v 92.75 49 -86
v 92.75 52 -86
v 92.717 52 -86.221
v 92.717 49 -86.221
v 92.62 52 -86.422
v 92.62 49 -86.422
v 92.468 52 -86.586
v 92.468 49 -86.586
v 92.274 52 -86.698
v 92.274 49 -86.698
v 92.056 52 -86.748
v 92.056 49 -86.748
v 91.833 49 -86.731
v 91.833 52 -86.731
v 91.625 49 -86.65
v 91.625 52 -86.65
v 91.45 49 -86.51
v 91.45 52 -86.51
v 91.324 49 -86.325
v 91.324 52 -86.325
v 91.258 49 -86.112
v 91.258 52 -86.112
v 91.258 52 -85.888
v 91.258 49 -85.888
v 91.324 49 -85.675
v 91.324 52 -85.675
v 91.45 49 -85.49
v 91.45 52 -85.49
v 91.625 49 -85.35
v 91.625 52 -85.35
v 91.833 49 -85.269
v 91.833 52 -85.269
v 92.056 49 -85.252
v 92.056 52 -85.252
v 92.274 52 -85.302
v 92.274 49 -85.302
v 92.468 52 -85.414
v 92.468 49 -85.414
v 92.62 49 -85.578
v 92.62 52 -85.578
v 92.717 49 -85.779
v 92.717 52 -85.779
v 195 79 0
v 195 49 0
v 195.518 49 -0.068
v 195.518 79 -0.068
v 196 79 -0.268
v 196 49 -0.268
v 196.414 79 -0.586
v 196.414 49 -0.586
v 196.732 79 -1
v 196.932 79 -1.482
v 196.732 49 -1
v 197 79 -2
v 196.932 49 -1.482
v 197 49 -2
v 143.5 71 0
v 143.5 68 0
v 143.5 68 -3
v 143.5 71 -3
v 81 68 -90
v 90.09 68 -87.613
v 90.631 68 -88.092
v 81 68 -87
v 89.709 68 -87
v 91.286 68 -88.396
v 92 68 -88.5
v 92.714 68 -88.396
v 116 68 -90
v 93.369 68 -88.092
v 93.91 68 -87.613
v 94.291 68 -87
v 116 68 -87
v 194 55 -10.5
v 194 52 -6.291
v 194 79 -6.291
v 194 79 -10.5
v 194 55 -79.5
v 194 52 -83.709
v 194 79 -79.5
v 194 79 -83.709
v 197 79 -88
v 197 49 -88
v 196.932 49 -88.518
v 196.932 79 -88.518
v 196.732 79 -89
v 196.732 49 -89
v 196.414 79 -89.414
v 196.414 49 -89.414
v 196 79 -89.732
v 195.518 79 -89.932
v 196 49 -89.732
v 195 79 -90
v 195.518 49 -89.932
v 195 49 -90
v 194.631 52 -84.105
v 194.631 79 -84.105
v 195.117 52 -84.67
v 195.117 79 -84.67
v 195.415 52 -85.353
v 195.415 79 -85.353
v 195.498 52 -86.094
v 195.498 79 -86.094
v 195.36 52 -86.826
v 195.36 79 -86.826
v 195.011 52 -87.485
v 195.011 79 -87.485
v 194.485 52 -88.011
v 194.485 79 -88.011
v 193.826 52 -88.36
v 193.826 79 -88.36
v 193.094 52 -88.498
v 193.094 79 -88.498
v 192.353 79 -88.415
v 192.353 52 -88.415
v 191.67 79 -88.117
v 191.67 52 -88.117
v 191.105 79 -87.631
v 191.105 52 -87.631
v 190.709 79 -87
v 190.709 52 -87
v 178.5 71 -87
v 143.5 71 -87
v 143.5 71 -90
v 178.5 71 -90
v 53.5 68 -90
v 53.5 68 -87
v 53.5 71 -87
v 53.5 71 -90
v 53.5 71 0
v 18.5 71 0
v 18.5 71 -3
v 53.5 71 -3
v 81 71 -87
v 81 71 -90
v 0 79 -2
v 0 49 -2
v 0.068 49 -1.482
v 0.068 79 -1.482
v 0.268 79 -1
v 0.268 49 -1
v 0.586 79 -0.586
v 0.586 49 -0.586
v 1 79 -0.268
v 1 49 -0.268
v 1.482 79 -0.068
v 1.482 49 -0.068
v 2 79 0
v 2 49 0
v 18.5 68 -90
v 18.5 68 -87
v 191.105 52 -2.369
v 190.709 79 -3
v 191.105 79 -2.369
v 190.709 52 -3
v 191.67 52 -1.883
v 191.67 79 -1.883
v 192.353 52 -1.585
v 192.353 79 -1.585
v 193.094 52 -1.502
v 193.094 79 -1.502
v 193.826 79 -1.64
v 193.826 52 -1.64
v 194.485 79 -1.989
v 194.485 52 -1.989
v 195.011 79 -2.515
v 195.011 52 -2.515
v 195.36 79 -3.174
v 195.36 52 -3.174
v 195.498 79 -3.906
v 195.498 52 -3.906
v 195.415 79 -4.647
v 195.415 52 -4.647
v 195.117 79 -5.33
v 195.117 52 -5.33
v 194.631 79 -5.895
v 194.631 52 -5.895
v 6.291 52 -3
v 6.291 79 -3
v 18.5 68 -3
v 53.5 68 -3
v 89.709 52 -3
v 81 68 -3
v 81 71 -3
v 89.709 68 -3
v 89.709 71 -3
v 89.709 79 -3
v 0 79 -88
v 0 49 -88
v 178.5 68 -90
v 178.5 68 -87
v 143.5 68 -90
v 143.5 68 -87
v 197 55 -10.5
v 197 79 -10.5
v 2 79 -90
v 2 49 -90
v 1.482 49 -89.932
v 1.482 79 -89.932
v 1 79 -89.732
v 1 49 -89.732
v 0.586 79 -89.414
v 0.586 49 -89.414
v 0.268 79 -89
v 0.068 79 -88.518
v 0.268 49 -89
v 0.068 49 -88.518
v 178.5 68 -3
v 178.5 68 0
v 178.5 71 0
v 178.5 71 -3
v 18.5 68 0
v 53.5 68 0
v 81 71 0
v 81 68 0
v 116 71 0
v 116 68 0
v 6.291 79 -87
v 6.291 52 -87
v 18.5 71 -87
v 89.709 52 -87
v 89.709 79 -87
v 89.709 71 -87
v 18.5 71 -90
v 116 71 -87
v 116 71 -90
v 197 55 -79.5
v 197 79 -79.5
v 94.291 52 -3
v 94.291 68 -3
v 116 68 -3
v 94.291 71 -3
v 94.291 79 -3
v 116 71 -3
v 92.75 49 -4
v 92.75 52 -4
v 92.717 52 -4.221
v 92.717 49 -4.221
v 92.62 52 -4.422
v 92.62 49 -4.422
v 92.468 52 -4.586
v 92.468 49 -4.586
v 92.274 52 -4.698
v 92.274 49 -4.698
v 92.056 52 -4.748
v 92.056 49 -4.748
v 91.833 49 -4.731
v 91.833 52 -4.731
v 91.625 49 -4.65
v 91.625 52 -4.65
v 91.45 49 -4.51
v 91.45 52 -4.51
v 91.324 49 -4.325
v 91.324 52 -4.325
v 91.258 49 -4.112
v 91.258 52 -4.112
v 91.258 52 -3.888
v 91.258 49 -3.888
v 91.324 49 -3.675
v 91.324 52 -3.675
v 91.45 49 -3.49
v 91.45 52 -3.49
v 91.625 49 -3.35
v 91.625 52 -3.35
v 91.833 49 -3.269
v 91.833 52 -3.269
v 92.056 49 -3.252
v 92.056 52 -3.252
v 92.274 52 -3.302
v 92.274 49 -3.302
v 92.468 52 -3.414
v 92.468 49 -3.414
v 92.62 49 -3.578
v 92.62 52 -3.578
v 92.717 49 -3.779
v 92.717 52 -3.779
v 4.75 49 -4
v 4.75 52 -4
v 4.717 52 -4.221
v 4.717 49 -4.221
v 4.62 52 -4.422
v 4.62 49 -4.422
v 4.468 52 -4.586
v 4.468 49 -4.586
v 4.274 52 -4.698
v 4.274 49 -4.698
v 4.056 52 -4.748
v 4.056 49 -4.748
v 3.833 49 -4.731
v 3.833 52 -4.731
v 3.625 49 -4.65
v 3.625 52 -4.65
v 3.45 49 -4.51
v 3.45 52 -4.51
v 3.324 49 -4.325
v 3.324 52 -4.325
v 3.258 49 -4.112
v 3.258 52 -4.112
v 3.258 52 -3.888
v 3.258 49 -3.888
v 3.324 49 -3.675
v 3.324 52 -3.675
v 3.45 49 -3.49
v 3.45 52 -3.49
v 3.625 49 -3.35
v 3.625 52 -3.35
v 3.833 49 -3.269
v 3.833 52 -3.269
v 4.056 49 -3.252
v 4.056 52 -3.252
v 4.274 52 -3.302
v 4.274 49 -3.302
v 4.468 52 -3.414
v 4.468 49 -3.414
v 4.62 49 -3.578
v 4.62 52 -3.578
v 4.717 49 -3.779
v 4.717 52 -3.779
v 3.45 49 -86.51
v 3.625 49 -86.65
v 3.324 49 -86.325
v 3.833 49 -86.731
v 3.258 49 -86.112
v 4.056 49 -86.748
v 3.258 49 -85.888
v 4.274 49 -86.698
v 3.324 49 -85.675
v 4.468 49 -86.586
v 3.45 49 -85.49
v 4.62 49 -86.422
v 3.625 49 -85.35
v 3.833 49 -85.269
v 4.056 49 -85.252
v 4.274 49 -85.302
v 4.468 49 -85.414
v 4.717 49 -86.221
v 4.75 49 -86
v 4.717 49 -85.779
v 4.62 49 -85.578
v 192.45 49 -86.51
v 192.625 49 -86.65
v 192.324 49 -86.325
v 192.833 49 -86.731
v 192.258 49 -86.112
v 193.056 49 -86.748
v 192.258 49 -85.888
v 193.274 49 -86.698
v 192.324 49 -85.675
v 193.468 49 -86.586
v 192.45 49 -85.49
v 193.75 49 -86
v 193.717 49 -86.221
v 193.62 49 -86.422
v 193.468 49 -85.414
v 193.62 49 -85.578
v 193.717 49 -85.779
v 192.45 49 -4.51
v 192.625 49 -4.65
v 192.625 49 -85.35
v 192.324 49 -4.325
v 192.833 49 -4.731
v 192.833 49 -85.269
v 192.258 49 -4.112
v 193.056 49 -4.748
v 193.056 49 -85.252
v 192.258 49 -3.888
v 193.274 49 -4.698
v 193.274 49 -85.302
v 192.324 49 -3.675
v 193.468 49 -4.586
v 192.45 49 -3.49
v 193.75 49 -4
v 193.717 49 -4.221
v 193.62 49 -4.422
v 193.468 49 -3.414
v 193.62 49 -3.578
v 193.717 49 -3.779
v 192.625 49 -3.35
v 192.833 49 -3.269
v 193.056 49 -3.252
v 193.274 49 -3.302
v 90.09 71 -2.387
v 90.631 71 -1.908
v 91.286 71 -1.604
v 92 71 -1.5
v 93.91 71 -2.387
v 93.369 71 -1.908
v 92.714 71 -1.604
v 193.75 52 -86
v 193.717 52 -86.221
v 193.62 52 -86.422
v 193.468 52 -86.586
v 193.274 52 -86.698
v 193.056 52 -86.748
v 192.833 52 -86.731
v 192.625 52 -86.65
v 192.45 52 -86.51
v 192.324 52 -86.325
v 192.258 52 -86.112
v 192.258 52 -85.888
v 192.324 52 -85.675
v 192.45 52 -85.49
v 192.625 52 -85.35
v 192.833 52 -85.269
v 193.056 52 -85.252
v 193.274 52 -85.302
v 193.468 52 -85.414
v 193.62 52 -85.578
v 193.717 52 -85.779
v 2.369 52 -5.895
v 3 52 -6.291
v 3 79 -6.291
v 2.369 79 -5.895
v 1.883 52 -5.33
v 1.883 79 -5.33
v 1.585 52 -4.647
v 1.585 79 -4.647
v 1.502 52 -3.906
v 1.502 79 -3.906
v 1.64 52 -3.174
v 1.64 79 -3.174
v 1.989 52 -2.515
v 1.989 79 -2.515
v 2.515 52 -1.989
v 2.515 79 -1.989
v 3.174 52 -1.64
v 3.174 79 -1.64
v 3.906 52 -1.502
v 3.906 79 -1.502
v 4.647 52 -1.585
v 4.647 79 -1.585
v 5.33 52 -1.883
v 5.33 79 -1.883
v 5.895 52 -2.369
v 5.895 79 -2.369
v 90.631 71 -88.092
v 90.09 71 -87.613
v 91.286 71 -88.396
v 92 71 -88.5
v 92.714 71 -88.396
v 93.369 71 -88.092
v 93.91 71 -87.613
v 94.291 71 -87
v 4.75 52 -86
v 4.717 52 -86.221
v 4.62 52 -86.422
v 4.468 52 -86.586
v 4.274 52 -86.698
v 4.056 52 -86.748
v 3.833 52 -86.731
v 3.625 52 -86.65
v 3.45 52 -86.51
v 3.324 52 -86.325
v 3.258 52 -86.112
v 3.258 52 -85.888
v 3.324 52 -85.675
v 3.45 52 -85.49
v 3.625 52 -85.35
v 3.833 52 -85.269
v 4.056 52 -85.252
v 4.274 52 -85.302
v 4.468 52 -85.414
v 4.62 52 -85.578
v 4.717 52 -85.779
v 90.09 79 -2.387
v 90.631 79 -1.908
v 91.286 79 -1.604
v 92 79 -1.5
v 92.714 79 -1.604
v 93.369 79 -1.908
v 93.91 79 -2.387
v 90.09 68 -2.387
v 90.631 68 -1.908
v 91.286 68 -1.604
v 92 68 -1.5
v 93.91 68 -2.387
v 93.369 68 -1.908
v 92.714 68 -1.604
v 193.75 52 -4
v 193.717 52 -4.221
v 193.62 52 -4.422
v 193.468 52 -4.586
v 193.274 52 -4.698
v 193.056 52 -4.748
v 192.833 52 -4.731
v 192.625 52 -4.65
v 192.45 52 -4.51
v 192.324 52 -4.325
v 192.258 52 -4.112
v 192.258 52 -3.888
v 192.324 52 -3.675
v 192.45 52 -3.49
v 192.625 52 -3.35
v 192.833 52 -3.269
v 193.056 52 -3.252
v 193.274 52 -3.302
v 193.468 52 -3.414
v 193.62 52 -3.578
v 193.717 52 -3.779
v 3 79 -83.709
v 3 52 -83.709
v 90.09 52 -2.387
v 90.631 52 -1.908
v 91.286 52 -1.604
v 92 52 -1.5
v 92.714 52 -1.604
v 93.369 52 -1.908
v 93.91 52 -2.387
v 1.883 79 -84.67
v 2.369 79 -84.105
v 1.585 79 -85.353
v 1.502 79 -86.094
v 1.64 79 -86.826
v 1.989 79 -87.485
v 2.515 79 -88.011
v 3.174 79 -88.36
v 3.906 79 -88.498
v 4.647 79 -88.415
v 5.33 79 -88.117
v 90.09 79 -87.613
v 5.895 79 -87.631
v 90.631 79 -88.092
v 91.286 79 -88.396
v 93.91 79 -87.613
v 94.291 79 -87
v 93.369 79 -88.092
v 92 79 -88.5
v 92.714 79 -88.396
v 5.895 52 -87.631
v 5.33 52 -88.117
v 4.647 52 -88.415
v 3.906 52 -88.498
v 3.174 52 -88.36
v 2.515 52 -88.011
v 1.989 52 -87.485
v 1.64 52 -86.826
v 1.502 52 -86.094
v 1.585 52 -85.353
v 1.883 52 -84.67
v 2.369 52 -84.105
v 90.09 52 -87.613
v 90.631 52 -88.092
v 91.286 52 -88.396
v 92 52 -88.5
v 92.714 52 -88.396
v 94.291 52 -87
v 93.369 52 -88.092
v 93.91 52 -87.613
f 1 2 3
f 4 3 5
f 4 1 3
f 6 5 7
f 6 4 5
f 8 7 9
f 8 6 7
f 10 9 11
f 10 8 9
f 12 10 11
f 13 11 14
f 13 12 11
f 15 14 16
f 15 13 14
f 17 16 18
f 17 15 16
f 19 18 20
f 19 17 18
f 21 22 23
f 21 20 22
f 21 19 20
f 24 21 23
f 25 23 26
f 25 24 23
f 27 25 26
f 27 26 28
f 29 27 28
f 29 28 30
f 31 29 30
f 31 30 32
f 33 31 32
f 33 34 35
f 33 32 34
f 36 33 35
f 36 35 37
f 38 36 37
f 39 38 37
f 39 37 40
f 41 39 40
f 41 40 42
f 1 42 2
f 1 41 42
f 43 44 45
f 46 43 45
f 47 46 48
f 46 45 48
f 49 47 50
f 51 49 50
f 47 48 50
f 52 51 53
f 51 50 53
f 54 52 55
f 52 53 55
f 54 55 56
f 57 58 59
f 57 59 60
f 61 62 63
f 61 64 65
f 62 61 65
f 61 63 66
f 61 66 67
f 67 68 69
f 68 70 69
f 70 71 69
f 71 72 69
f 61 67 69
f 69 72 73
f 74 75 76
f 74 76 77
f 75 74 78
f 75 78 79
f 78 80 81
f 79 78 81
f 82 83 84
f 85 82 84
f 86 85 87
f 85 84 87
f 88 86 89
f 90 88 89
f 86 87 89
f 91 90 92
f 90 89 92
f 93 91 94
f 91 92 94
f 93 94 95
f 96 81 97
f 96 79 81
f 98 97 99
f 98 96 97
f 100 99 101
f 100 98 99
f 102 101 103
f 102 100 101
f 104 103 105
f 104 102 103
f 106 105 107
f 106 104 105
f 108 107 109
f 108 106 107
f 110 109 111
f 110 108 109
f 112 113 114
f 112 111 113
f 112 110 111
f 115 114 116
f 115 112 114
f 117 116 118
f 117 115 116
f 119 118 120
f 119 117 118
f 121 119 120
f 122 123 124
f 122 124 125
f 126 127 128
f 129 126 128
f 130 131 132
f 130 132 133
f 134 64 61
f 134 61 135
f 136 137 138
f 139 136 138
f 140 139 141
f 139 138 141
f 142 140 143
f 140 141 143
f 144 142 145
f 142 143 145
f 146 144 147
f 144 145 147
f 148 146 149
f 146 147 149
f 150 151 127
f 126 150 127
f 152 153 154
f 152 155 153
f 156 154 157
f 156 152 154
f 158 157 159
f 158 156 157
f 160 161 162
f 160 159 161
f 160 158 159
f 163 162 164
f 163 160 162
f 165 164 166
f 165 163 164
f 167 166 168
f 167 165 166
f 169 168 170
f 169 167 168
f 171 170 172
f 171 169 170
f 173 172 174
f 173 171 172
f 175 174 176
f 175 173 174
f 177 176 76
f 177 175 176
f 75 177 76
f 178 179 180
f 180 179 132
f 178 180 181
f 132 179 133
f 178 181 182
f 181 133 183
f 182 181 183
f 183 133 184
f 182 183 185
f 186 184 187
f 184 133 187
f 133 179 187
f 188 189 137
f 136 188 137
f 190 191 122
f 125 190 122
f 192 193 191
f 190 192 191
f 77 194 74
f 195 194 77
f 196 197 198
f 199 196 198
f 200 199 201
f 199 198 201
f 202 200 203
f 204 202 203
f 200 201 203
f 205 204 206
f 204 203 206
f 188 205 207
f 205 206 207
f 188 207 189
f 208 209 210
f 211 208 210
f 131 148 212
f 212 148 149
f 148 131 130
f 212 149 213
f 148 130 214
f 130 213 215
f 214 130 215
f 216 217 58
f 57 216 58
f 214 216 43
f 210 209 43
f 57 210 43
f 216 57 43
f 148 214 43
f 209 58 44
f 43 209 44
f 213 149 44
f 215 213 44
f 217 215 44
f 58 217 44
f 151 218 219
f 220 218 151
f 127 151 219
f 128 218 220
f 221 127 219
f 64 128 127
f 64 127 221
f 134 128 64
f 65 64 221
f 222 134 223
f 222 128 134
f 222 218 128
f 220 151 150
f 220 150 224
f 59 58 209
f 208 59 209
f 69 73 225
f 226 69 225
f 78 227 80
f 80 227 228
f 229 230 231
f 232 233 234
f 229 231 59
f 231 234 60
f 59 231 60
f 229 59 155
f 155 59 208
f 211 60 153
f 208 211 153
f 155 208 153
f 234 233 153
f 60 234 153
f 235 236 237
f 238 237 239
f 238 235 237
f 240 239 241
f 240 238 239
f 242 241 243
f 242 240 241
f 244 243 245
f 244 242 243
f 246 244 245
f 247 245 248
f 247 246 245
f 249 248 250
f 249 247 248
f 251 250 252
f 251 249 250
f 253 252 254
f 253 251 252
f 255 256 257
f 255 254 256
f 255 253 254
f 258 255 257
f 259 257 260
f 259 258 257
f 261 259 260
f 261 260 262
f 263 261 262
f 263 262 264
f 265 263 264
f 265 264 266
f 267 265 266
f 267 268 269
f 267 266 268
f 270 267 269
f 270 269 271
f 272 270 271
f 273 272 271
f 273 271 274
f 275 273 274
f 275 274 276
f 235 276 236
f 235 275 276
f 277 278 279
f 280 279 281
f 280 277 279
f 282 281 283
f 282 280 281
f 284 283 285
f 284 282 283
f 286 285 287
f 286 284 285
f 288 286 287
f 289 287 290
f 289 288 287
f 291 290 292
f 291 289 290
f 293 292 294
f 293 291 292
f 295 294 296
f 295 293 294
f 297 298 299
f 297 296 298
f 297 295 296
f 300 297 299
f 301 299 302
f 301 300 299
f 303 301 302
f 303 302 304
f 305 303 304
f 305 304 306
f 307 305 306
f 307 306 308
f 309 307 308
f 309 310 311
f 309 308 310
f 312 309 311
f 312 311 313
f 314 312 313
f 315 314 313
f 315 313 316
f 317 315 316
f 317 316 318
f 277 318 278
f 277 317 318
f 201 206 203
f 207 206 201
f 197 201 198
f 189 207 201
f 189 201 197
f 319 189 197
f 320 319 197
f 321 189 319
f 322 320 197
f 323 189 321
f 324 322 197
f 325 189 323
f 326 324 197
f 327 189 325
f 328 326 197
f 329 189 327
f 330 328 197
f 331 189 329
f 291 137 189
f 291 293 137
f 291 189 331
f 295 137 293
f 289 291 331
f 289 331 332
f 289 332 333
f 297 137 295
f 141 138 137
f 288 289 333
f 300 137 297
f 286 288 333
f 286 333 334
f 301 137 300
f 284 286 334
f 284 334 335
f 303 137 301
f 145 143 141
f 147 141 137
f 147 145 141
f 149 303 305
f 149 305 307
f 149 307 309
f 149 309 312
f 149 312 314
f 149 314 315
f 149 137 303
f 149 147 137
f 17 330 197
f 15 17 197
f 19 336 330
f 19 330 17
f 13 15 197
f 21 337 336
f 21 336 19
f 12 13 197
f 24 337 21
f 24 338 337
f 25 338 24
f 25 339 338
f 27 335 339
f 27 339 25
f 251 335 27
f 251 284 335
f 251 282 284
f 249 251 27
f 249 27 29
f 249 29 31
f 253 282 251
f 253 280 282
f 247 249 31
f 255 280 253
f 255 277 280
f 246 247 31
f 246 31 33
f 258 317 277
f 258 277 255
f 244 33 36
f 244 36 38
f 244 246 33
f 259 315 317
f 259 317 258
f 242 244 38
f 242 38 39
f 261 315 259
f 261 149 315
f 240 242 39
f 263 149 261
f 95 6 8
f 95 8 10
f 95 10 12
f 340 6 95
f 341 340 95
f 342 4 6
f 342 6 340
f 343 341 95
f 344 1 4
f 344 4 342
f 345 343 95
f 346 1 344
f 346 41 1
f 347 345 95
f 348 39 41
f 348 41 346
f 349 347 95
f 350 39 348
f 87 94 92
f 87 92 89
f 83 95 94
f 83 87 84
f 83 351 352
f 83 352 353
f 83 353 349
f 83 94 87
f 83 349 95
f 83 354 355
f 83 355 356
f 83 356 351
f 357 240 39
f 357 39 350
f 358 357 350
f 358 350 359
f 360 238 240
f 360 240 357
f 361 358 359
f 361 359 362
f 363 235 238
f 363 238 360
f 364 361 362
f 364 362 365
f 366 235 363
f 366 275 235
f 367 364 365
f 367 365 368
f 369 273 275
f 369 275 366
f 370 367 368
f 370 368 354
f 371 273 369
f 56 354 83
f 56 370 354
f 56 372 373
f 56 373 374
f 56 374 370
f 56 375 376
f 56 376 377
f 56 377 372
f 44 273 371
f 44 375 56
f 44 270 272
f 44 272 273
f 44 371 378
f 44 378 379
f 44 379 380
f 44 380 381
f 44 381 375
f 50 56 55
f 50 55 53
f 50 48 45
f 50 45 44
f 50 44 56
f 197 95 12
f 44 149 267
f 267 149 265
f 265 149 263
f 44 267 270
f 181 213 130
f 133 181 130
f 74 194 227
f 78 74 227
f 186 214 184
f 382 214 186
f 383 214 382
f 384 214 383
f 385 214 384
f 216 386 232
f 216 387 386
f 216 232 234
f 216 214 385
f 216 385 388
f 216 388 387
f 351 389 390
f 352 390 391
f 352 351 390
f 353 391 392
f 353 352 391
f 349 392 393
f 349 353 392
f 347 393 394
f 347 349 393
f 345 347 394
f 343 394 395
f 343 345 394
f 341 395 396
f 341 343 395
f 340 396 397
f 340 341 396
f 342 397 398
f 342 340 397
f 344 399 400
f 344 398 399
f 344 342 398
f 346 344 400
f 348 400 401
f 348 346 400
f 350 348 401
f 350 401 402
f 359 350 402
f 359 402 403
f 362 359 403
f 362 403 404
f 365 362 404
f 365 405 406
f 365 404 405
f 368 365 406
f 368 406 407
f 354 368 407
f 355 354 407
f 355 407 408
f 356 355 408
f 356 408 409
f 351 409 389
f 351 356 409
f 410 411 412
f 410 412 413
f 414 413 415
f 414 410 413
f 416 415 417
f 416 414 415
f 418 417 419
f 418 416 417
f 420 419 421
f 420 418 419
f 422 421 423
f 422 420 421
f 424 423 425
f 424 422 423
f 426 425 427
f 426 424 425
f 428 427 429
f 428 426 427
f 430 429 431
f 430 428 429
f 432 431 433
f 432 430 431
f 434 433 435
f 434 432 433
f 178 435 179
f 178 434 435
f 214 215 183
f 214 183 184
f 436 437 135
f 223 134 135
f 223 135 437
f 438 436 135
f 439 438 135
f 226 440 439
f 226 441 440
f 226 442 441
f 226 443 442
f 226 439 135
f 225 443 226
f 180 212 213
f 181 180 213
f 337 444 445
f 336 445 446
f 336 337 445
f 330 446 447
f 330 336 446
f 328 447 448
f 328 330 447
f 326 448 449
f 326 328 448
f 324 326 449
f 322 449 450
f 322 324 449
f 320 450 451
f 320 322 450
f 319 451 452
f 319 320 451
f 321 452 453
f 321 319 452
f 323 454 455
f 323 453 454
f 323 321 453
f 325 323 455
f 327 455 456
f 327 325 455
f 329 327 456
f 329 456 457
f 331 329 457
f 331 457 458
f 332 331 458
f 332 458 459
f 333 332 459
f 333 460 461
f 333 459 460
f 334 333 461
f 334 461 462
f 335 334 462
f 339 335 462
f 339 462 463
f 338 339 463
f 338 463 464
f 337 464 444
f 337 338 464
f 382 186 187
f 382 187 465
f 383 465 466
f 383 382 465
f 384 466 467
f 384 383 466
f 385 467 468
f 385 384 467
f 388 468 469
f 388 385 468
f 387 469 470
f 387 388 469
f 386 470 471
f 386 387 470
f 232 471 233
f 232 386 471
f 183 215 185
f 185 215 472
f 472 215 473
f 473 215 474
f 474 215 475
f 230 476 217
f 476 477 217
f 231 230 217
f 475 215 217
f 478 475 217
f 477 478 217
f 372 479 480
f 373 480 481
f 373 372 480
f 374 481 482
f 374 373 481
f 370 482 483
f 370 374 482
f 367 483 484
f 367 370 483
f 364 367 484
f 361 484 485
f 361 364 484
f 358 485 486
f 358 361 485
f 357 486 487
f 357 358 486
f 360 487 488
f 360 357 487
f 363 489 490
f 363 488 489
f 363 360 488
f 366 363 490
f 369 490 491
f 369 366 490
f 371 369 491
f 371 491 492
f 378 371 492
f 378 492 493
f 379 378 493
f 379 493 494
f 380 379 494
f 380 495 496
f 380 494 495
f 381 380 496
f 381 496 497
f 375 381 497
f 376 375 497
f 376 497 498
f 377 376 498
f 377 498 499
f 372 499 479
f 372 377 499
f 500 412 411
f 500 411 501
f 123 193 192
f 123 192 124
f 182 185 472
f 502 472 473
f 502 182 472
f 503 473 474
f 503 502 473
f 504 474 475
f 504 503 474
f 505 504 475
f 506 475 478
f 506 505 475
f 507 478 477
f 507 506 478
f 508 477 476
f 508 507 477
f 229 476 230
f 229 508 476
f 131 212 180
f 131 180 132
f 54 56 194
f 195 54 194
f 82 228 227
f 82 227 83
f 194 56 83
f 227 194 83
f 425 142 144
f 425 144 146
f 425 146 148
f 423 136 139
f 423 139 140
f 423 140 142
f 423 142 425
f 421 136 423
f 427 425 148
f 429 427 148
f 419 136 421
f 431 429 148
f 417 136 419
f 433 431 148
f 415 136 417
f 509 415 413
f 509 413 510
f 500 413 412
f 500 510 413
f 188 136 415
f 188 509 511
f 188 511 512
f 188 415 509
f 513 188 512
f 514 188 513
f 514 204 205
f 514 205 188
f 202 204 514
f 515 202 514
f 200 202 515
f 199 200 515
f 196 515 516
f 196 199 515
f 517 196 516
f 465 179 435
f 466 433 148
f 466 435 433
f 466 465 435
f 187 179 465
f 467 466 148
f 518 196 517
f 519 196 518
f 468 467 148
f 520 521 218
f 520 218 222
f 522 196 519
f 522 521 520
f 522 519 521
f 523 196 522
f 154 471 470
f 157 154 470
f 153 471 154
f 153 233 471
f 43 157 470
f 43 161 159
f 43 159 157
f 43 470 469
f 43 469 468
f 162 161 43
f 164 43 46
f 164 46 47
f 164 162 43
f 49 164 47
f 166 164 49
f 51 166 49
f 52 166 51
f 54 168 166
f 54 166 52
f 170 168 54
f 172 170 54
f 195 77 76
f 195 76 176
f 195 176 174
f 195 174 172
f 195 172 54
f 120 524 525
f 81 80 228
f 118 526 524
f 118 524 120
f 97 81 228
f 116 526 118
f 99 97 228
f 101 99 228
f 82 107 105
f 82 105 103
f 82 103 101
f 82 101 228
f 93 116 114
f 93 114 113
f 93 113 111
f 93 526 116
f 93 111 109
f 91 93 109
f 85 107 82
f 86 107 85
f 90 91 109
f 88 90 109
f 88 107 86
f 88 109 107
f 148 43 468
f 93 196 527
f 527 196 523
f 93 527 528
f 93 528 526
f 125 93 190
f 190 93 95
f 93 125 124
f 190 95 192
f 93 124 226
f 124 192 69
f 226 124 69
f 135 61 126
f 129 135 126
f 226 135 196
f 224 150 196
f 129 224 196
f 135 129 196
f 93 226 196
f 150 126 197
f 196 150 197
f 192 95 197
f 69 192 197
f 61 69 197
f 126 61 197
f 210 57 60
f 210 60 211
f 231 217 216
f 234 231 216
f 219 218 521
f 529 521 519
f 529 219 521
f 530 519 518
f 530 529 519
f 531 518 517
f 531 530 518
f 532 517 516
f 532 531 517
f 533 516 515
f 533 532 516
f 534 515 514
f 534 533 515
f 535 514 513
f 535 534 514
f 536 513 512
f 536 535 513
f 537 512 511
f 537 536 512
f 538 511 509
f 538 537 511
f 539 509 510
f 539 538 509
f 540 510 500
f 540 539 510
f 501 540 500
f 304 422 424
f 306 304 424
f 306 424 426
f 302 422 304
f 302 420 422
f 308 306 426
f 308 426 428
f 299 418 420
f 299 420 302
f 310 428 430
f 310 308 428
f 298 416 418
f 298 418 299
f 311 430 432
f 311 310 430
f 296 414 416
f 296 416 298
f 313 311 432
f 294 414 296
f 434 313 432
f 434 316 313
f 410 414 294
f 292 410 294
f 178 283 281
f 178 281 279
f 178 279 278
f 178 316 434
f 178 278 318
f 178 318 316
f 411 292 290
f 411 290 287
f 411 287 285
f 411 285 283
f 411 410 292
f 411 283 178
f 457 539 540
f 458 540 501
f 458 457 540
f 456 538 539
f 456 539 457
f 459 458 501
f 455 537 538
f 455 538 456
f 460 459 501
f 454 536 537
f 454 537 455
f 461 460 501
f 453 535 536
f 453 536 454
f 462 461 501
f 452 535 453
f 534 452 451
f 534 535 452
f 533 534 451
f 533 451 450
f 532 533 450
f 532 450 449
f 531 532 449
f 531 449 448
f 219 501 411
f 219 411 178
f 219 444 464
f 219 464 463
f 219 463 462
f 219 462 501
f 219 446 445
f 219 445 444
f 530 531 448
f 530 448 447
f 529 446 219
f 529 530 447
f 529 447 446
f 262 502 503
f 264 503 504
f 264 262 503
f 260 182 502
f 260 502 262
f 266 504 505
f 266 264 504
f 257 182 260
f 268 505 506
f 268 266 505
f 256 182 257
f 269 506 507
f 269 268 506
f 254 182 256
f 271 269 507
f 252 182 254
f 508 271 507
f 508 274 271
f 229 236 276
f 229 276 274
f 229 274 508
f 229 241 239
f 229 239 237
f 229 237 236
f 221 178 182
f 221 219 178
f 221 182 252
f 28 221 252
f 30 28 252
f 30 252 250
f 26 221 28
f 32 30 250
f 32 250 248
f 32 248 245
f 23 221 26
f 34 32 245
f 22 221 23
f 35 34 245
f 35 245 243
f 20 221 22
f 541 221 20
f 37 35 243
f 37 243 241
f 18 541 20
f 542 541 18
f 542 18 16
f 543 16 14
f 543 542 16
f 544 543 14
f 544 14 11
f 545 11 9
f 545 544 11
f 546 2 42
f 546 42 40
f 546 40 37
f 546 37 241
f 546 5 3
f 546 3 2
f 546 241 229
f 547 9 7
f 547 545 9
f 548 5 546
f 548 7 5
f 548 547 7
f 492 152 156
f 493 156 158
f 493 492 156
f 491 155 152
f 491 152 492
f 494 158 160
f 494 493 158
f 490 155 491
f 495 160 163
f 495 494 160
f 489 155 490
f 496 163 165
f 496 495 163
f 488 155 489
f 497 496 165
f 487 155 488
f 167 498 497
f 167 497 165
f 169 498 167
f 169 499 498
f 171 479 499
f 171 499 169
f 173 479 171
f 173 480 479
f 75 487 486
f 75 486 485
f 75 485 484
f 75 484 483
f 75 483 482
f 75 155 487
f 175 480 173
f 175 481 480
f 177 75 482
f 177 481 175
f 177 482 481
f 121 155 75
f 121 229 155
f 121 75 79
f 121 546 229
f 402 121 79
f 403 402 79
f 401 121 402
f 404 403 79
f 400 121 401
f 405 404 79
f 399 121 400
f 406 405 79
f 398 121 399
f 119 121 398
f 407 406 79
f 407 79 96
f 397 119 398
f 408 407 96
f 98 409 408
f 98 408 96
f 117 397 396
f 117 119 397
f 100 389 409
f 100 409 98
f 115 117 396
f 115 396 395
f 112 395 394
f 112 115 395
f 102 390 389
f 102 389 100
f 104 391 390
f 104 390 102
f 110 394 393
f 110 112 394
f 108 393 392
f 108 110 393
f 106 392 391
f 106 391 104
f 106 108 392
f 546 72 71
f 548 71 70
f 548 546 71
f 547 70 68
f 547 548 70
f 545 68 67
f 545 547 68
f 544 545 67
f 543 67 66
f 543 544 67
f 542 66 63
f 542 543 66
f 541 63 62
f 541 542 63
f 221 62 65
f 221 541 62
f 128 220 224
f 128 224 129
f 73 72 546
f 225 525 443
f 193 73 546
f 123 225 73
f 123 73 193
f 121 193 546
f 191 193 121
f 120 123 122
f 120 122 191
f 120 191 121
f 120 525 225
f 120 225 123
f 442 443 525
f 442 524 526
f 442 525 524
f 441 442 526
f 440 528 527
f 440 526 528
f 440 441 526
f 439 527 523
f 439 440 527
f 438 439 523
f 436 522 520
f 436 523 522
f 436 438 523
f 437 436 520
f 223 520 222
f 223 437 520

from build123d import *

# Parameters (mm, degrees)
SKETCH2_W               = 197
SKETCH2_H               = 90
BOSS_EXTRUDE1_DEPTH     = 21
SHELL1_T                = -2
SKETCH3_R               = 3.325
SKETCH3_R_2             = 1.325
BOSS_EXTRUDE2_DEPTH     = 2
SKETCH6_R               = 1.325
CUT_EXTRUDE2_DEPTH      = 3
BOSS_EXTRUDE3_DEPTH     = 19
SKETCH10_W              = 3
SKETCH10_H              = 12
CUT_EXTRUDE5_DEPTH      = 19
SKETCH12_W              = 29.592043876
SKETCH12_H              = 2
CUT_EXTRUDE6_DEPTH      = 10
CUT_EXTRUDE6_DEPTH_BACK = 73
CUT_EXTRUDE8_DEPTH      = 10
FILLET1_R               = 2
SKETCH7_R               = 6
CUT_EXTRUDE9_DEPTH      = 10
BOSS_EXTRUDE4_DEPTH     = 24
SKETCH18_W              = 191
SKETCH18_H              = 84
CUT_EXTRUDE10_DEPTH     = 21
BOSS_EXTRUDE5_DEPTH     = 19
SKETCH22_R              = 0.75
CUT_EXTRUDE11_DEPTH     = 44
SKETCH23_R              = 2
CUT_EXTRUDE12_DEPTH     = 22
SKETCH24_W              = 197
SKETCH24_H              = 24
CUT_EXTRUDE13_DEPTH     = 91
SKETCH25_R              = 0.75
BOSS_EXTRUDE9_DEPTH     = 28
BOSS_EXTRUDE10_START    = -2
BOSS_EXTRUDE10_DEPTH    = 2
BOSS_EXTRUDE11_DEPTH    = 30
SKETCH28_W              = 191
SKETCH28_H              = 84
CUT_EXTRUDE14_DEPTH     = 27
SKETCH29_R              = 0.75
CUT_EXTRUDE15_DEPTH     = 78
SKETCH30_W              = 197
SKETCH30_H              = 49
CUT_EXTRUDE16_DEPTH     = 91
SKETCH31_W              = 69
SKETCH31_H              = 24
CUT_EXTRUDE17_DEPTH     = 10
SKETCH32_R              = 2.5
CUT_EXTRUDE18_DEPTH     = 28
SKETCH33_W              = 35
SKETCH33_H              = 3
CUT_EXTRUDE19_DEPTH     = 91


with BuildPart() as part:
    # Sketch2 → Boss-Extrude1 (new body)
    with BuildSketch(Plane(origin=(0, 0, 0), x_dir=(1, 0, 0), z_dir=(0, 1, 0))):
        with Locations((98.5, 45)):
            Rectangle(SKETCH2_W, SKETCH2_H)
    extrude(amount=BOSS_EXTRUDE1_DEPTH)

    # Shell1
    shell1_openings = [part.faces().sort_by_distance(p)[0] for p in [
        (98.5, 21, -45),
    ]]
    offset(amount=SHELL1_T, openings=shell1_openings, kind=Kind.INTERSECTION)

    # Sketch3 → Boss-Extrude2 (add)
    with BuildSketch(Plane(origin=(0.486650368, 2, 38.670182975), x_dir=(1, 0, 0), z_dir=(0, 1, 0))):
        with Locations((118.948969004, 54.089521182)):
            Circle(SKETCH3_R)
        with Locations((118.948969004, 54.089521182)):
            Circle(SKETCH3_R_2, mode=Mode.SUBTRACT)
        with Locations((95.898969004, 54.089521182)):
            Circle(SKETCH3_R)
        with Locations((95.898969004, 54.089521182)):
            Circle(SKETCH3_R_2, mode=Mode.SUBTRACT)
        with Locations((95.898969004, 112.139521182)):
            Circle(SKETCH3_R)
        with Locations((95.898969004, 112.139521182)):
            Circle(SKETCH3_R_2, mode=Mode.SUBTRACT)
        with Locations((118.948969004, 112.139521182)):
            Circle(SKETCH3_R)
        with Locations((118.948969004, 112.139521182)):
            Circle(SKETCH3_R_2, mode=Mode.SUBTRACT)
    extrude(amount=BOSS_EXTRUDE2_DEPTH)

    # Sketch6 → Cut-Extrude2 (cut, through all)
    with BuildSketch(Plane(origin=(0, 2, 0), x_dir=(1, 0, 0), z_dir=(0, 1, 0))):
        with Locations((96.385619372, 73.469338207)):
            Circle(SKETCH6_R)
        with Locations((119.435619372, 73.469338207)):
            Circle(SKETCH6_R)
        with Locations((119.435619372, 15.419338207)):
            Circle(SKETCH6_R)
        with Locations((96.385619372, 15.419338207)):
            Circle(SKETCH6_R)
    extrude(amount=-CUT_EXTRUDE2_DEPTH, mode=Mode.SUBTRACT)

    # Sketch8 → Boss-Extrude3 (add)
    with BuildSketch(Plane(origin=(0, 2, 0), x_dir=(1, 0, 0), z_dir=(0, 1, 0))):
        Polygon((2, 28), (87, 28), (87, 87), (2, 87), (2, 90), (90, 90), (90, 25), (2, 25), align=None)
    extrude(amount=BOSS_EXTRUDE3_DEPTH)

    # Sketch10 → Cut-Extrude5 (cut)
    with BuildSketch(Plane(origin=(0, 21, 0), x_dir=(1, 0, 0), z_dir=(0, 1, 0))):
        with Locations((88.5, 57.5)):
            Rectangle(SKETCH10_W, SKETCH10_H)
    extrude(amount=-CUT_EXTRUDE5_DEPTH, mode=Mode.SUBTRACT)

    # Sketch12 → Cut-Extrude6 (cut, two sides)
    with BuildSketch(Plane(origin=(0, 0, -75), x_dir=(-1, 0, 0), z_dir=(0, 0, -1))) as cut_extrude6_sk:
        with Locations((-42.979341868, 13.109706)):
            Rectangle(SKETCH12_W, SKETCH12_H)
        with Locations((-42.979341868, 8.109706)):
            Rectangle(SKETCH12_W, SKETCH12_H)
    extrude(amount=CUT_EXTRUDE6_DEPTH, mode=Mode.SUBTRACT)
    extrude(cut_extrude6_sk.sketch, amount=-CUT_EXTRUDE6_DEPTH_BACK, mode=Mode.SUBTRACT)

    # Sketch16 → Cut-Extrude8 (cut)
    with BuildSketch(Plane(origin=(197, 0, 0), x_dir=(0, 0, -1), z_dir=(1, 0, 0))):
        with BuildLine():
            Line((48, 14.235547834), (48, 21))
            Line((48, 21), (42, 21))
            Line((42, 21), (42, 14.235547834))
            ThreePointArc((42, 14.235547834), (45, 11.235547834), (48, 14.235547834))
        make_face()
    extrude(amount=-CUT_EXTRUDE8_DEPTH, mode=Mode.SUBTRACT)

    # Fillet1
    fillet1_edges = [part.edges().sort_by_distance(p)[0] for p in [
        (98.5, 0, -90),
        (197, 0, -45),
        (98.5, 0, 0),
        (0, 0, -45),
        (0, 10.5, -90),
        (197, 10.5, -90),
        (197, 10.5, 0),
        (0, 10.5, 0),
    ]]
    fillet(fillet1_edges, radius=FILLET1_R)

    # Sketch7 → Cut-Extrude9 (cut)
    with BuildSketch(Plane.ZY):
        with Locations((-57.5, 13.5)):
            Circle(SKETCH7_R)
    extrude(amount=-CUT_EXTRUDE9_DEPTH, mode=Mode.SUBTRACT)

    # Sketch17 → Boss-Extrude4 (add)
    with BuildSketch(Plane(origin=(0, 21, 0), x_dir=(1, 0, 0), z_dir=(0, 1, 0))):
        with BuildLine():
            Line((197, 48), (197, 42))
            Line((197, 42), (197, 2))
            ThreePointArc((197, 2), (196.414213562, 0.585786438), (195, 0))
            Line((195, 0), (2, 0))
            ThreePointArc((2, 0), (0.585786438, 0.585786438), (0, 2))
            Line((0, 2), (0, 88))
            ThreePointArc((0, 88), (0.585786438, 89.414213562), (2, 90))
            Line((2, 90), (195, 90))
            ThreePointArc((195, 90), (196.414213562, 89.414213562), (197, 88))
            Line((197, 88), (197, 48))
        make_face()
    extrude(amount=BOSS_EXTRUDE4_DEPTH)

    # Sketch18 → Cut-Extrude10 (cut)
    with BuildSketch(Plane(origin=(0, 45, 0), x_dir=(1, 0, 0), z_dir=(0, 1, 0))):
        with Locations((98.5, 45)):
            Rectangle(SKETCH18_W, SKETCH18_H)
    extrude(amount=-CUT_EXTRUDE10_DEPTH, mode=Mode.SUBTRACT)

    # Sketch19 → Boss-Extrude5 (add)
    with BuildSketch(Plane(origin=(0, 2, 0), x_dir=(1, 0, 0), z_dir=(0, 1, 0))):
        with BuildLine():
            Line((193, 88), (195, 88))
            Line((195, 88), (195, 84))
            Line((195, 84), (193, 84))
            ThreePointArc((193, 84), (191.585786438, 84.585786438), (191, 86))
            Line((191, 86), (191, 88))
            Line((191, 88), (193, 88))
        make_face()
        with BuildLine():
            Line((191, 2), (193, 2))
            Line((193, 2), (195, 2))
            Line((195, 2), (195, 6))
            Line((195, 6), (193, 6))
            ThreePointArc((193, 6), (191.585786438, 5.414213562), (191, 4))
            Line((191, 4), (191, 2))
        make_face()
        with BuildLine():
            Line((94, 4), (94, 2))
            Line((94, 2), (90, 2))
            Line((90, 2), (90, 4))
            ThreePointArc((90, 4), (92, 6), (94, 4))
        make_face()
        with BuildLine():
            Line((92, 84), (90, 84))
            Line((90, 84), (90, 88))
            Line((90, 88), (94, 88))
            Line((94, 88), (94, 86))
            ThreePointArc((94, 86), (93.414213562, 84.585786438), (92, 84))
        make_face()
        with BuildLine():
            Line((2, 88), (2, 84))
            Line((2, 84), (4, 84))
            ThreePointArc((4, 84), (5.414213562, 84.585786438), (6, 86))
            Line((6, 86), (6, 88))
            Line((6, 88), (2, 88))
        make_face()
        with BuildLine():
            Line((6, 4), (6, 2))
            Line((6, 2), (2, 2))
            Line((2, 2), (2, 6))
            Line((2, 6), (4, 6))
            ThreePointArc((4, 6), (5.414213562, 5.414213562), (6, 4))
        make_face()
    extrude(amount=BOSS_EXTRUDE5_DEPTH)

    # Sketch22 → Cut-Extrude11 (cut, through all)
    with BuildSketch(Plane(origin=(0, 2, 0), x_dir=(1, 0, 0), z_dir=(0, 1, 0))):
        with Locations((4, 4)):
            Circle(SKETCH22_R)
        with Locations((4, 86)):
            Circle(SKETCH22_R)
        with Locations((92, 86)):
            Circle(SKETCH22_R)
        with Locations((193, 86)):
            Circle(SKETCH22_R)
        with Locations((193, 4)):
            Circle(SKETCH22_R)
        with Locations((92, 4)):
            Circle(SKETCH22_R)
    extrude(amount=CUT_EXTRUDE11_DEPTH, mode=Mode.SUBTRACT)

    # Sketch23 → Cut-Extrude12 (cut, through all)
    with BuildSketch(Plane(origin=(0, 24, 0), x_dir=(1, 0, 0), z_dir=(0, 1, 0))):
        with Locations((92, 4)):
            Circle(SKETCH23_R)
        with Locations((4, 4)):
            Circle(SKETCH23_R)
        with Locations((4, 86)):
            Circle(SKETCH23_R)
        with Locations((92, 86)):
            Circle(SKETCH23_R)
        with Locations((193, 86)):
            Circle(SKETCH23_R)
        with Locations((181, 4)):
            Circle(SKETCH23_R)
    extrude(amount=CUT_EXTRUDE12_DEPTH, mode=Mode.SUBTRACT)

    # Sketch24 → Cut-Extrude13 (cut, through all)
    with BuildSketch(Plane.XY):
        with Locations((98.5, 33)):
            Rectangle(SKETCH24_W, SKETCH24_H)
    extrude(amount=-CUT_EXTRUDE13_DEPTH, mode=Mode.SUBTRACT)

    # Sketch25 → Boss-Extrude9 (add)
    with BuildSketch(Plane(origin=(0, 21, 0), x_dir=(1, 0, 0), z_dir=(0, 1, 0))):
        with BuildLine():
            Line((197, 42), (197, 48))
            Line((197, 48), (197, 88))
            ThreePointArc((197, 88), (196.414213562, 89.414213562), (195, 90))
            Line((195, 90), (2, 90))
            ThreePointArc((2, 90), (0.585786438, 89.414213562), (0, 88))
            Line((0, 88), (0, 2))
            ThreePointArc((0, 2), (0.585786438, 0.585786438), (2, 0))
            Line((2, 0), (195, 0))
            ThreePointArc((195, 0), (196.414213562, 0.585786438), (197, 2))
            Line((197, 2), (197, 42))
        make_face()
        with Locations((4, 4)):
            Circle(SKETCH25_R, mode=Mode.SUBTRACT)
        with Locations((4, 86)):
            Circle(SKETCH25_R, mode=Mode.SUBTRACT)
        with Locations((92, 86)):
            Circle(SKETCH25_R, mode=Mode.SUBTRACT)
        with Locations((193, 86)):
            Circle(SKETCH25_R, mode=Mode.SUBTRACT)
        with Locations((193, 4)):
            Circle(SKETCH25_R, mode=Mode.SUBTRACT)
        with Locations((92, 4)):
            Circle(SKETCH25_R, mode=Mode.SUBTRACT)
        with BuildLine():
            Line((2, 25), (2, 28))
            Line((2, 28), (2, 84))
            Line((2, 84), (4, 84))
            ThreePointArc((4, 84), (5.414213562, 84.585786438), (6, 86))
            Line((6, 86), (6, 87))
            Line((6, 87), (87, 87))
            Line((87, 87), (90, 87))
            Line((90, 87), (90, 84))
            Line((90, 84), (92, 84))
            ThreePointArc((92, 84), (93.414213562, 84.585786438), (94, 86))
            Line((94, 86), (94, 88))
            Line((94, 88), (191, 88))
            Line((191, 88), (191, 86))
            ThreePointArc((191, 86), (191.585786438, 84.585786438), (193, 84))
            Line((193, 84), (195, 84))
            Line((195, 84), (195, 48))
            Line((195, 48), (195, 42))
            Line((195, 42), (195, 6))
            Line((195, 6), (193, 6))
            ThreePointArc((193, 6), (191.585786438, 5.414213562), (191, 4))
            Line((191, 4), (191, 2))
            Line((191, 2), (94, 2))
            Line((94, 2), (94, 4))
            ThreePointArc((94, 4), (92, 6), (90, 4))
            Line((90, 4), (90, 2))
            Line((90, 2), (6, 2))
            Line((6, 2), (6, 4))
            ThreePointArc((6, 4), (5.414213562, 5.414213562), (4, 6))
            Line((4, 6), (2, 6))
            Line((2, 6), (2, 25))
        make_face(mode=Mode.SUBTRACT)
    extrude(amount=BOSS_EXTRUDE9_DEPTH)

    # Sketch26 → Boss-Extrude10 (add)
    with BuildSketch(Plane(origin=(197, 0, 0), x_dir=(0, 0, -1), z_dir=(1, 0, 0)).offset(BOSS_EXTRUDE10_START)):
        with BuildLine():
            Line((48, 21), (42, 21))
            Line((42, 21), (42, 14.235547834))
            ThreePointArc((42, 14.235547834), (45, 11.235547834), (48, 14.235547834))
            Line((48, 14.235547834), (48, 21))
        make_face()
    extrude(amount=BOSS_EXTRUDE10_DEPTH)

    # Sketch27 → Boss-Extrude11 (add)
    with BuildSketch(Plane(origin=(0, 49, 0), x_dir=(1, 0, 0), z_dir=(0, 1, 0))):
        with BuildLine():
            Line((197, 2), (197, 88))
            ThreePointArc((197, 88), (196.414213562, 89.414213562), (195, 90))
            Line((195, 90), (2, 90))
            ThreePointArc((2, 90), (0.585786438, 89.414213562), (0, 88))
            Line((0, 88), (0, 2))
            ThreePointArc((0, 2), (0.585786438, 0.585786438), (2, 0))
            Line((2, 0), (195, 0))
            ThreePointArc((195, 0), (196.414213562, 0.585786438), (197, 2))
        make_face()
    extrude(amount=BOSS_EXTRUDE11_DEPTH)

    # Sketch28 → Cut-Extrude14 (cut)
    with BuildSketch(Plane(origin=(0, 79, 0), x_dir=(1, 0, 0), z_dir=(0, 1, 0))):
        with Locations((98.5, 45)):
            Rectangle(SKETCH28_W, SKETCH28_H)
    extrude(amount=-CUT_EXTRUDE14_DEPTH, mode=Mode.SUBTRACT)

    # Sketch29 → Cut-Extrude15 (cut, through all)
    with BuildSketch(Plane(origin=(0, 2, 0), x_dir=(1, 0, 0), z_dir=(0, 1, 0))):
        with Locations((4, 4)):
            Circle(SKETCH29_R)
        with Locations((4, 86)):
            Circle(SKETCH29_R)
        with Locations((193, 86)):
            Circle(SKETCH29_R)
        with Locations((193, 4)):
            Circle(SKETCH29_R)
        with Locations((92, 4)):
            Circle(SKETCH29_R)
        with Locations((92, 86)):
            Circle(SKETCH29_R)
    extrude(amount=CUT_EXTRUDE15_DEPTH, mode=Mode.SUBTRACT)

    # Sketch30 → Cut-Extrude16 (cut, through all)
    with BuildSketch(Plane.XY):
        with Locations((98.5, 24.5)):
            Rectangle(SKETCH30_W, SKETCH30_H)
    extrude(amount=-CUT_EXTRUDE16_DEPTH, mode=Mode.SUBTRACT)

    # Sketch31 → Cut-Extrude17 (cut)
    with BuildSketch(Plane(origin=(197, 0, 0), x_dir=(0, 0, -1), z_dir=(1, 0, 0))):
        with Locations((45, 67)):
            Rectangle(SKETCH31_W, SKETCH31_H)
    extrude(amount=-CUT_EXTRUDE17_DEPTH, mode=Mode.SUBTRACT)

    # Sketch32 → Cut-Extrude18 (cut, through all)
    with BuildSketch(Plane(origin=(0, 52, 0), x_dir=(1, 0, 0), z_dir=(0, 1, 0))):
        with Locations((4, 4)):
            Circle(SKETCH32_R)
        with Locations((4, 86)):
            Circle(SKETCH32_R)
        with Locations((92, 86)):
            Circle(SKETCH32_R)
        with Locations((193, 86)):
            Circle(SKETCH32_R)
        with Locations((193, 4)):
            Circle(SKETCH32_R)
        with Locations((92, 4)):
            Circle(SKETCH32_R)
    extrude(amount=CUT_EXTRUDE18_DEPTH, mode=Mode.SUBTRACT)

    # Sketch33 → Cut-Extrude19 (cut, through all)
    with BuildSketch(Plane.XY):
        with Locations((36, 69.5)):
            Rectangle(SKETCH33_W, SKETCH33_H)
        with Locations((98.5, 69.5)):
            Rectangle(SKETCH33_W, SKETCH33_H)
        with Locations((161, 69.5)):
            Rectangle(SKETCH33_W, SKETCH33_H)
    extrude(amount=-CUT_EXTRUDE19_DEPTH, mode=Mode.SUBTRACT)


solid = part.part
